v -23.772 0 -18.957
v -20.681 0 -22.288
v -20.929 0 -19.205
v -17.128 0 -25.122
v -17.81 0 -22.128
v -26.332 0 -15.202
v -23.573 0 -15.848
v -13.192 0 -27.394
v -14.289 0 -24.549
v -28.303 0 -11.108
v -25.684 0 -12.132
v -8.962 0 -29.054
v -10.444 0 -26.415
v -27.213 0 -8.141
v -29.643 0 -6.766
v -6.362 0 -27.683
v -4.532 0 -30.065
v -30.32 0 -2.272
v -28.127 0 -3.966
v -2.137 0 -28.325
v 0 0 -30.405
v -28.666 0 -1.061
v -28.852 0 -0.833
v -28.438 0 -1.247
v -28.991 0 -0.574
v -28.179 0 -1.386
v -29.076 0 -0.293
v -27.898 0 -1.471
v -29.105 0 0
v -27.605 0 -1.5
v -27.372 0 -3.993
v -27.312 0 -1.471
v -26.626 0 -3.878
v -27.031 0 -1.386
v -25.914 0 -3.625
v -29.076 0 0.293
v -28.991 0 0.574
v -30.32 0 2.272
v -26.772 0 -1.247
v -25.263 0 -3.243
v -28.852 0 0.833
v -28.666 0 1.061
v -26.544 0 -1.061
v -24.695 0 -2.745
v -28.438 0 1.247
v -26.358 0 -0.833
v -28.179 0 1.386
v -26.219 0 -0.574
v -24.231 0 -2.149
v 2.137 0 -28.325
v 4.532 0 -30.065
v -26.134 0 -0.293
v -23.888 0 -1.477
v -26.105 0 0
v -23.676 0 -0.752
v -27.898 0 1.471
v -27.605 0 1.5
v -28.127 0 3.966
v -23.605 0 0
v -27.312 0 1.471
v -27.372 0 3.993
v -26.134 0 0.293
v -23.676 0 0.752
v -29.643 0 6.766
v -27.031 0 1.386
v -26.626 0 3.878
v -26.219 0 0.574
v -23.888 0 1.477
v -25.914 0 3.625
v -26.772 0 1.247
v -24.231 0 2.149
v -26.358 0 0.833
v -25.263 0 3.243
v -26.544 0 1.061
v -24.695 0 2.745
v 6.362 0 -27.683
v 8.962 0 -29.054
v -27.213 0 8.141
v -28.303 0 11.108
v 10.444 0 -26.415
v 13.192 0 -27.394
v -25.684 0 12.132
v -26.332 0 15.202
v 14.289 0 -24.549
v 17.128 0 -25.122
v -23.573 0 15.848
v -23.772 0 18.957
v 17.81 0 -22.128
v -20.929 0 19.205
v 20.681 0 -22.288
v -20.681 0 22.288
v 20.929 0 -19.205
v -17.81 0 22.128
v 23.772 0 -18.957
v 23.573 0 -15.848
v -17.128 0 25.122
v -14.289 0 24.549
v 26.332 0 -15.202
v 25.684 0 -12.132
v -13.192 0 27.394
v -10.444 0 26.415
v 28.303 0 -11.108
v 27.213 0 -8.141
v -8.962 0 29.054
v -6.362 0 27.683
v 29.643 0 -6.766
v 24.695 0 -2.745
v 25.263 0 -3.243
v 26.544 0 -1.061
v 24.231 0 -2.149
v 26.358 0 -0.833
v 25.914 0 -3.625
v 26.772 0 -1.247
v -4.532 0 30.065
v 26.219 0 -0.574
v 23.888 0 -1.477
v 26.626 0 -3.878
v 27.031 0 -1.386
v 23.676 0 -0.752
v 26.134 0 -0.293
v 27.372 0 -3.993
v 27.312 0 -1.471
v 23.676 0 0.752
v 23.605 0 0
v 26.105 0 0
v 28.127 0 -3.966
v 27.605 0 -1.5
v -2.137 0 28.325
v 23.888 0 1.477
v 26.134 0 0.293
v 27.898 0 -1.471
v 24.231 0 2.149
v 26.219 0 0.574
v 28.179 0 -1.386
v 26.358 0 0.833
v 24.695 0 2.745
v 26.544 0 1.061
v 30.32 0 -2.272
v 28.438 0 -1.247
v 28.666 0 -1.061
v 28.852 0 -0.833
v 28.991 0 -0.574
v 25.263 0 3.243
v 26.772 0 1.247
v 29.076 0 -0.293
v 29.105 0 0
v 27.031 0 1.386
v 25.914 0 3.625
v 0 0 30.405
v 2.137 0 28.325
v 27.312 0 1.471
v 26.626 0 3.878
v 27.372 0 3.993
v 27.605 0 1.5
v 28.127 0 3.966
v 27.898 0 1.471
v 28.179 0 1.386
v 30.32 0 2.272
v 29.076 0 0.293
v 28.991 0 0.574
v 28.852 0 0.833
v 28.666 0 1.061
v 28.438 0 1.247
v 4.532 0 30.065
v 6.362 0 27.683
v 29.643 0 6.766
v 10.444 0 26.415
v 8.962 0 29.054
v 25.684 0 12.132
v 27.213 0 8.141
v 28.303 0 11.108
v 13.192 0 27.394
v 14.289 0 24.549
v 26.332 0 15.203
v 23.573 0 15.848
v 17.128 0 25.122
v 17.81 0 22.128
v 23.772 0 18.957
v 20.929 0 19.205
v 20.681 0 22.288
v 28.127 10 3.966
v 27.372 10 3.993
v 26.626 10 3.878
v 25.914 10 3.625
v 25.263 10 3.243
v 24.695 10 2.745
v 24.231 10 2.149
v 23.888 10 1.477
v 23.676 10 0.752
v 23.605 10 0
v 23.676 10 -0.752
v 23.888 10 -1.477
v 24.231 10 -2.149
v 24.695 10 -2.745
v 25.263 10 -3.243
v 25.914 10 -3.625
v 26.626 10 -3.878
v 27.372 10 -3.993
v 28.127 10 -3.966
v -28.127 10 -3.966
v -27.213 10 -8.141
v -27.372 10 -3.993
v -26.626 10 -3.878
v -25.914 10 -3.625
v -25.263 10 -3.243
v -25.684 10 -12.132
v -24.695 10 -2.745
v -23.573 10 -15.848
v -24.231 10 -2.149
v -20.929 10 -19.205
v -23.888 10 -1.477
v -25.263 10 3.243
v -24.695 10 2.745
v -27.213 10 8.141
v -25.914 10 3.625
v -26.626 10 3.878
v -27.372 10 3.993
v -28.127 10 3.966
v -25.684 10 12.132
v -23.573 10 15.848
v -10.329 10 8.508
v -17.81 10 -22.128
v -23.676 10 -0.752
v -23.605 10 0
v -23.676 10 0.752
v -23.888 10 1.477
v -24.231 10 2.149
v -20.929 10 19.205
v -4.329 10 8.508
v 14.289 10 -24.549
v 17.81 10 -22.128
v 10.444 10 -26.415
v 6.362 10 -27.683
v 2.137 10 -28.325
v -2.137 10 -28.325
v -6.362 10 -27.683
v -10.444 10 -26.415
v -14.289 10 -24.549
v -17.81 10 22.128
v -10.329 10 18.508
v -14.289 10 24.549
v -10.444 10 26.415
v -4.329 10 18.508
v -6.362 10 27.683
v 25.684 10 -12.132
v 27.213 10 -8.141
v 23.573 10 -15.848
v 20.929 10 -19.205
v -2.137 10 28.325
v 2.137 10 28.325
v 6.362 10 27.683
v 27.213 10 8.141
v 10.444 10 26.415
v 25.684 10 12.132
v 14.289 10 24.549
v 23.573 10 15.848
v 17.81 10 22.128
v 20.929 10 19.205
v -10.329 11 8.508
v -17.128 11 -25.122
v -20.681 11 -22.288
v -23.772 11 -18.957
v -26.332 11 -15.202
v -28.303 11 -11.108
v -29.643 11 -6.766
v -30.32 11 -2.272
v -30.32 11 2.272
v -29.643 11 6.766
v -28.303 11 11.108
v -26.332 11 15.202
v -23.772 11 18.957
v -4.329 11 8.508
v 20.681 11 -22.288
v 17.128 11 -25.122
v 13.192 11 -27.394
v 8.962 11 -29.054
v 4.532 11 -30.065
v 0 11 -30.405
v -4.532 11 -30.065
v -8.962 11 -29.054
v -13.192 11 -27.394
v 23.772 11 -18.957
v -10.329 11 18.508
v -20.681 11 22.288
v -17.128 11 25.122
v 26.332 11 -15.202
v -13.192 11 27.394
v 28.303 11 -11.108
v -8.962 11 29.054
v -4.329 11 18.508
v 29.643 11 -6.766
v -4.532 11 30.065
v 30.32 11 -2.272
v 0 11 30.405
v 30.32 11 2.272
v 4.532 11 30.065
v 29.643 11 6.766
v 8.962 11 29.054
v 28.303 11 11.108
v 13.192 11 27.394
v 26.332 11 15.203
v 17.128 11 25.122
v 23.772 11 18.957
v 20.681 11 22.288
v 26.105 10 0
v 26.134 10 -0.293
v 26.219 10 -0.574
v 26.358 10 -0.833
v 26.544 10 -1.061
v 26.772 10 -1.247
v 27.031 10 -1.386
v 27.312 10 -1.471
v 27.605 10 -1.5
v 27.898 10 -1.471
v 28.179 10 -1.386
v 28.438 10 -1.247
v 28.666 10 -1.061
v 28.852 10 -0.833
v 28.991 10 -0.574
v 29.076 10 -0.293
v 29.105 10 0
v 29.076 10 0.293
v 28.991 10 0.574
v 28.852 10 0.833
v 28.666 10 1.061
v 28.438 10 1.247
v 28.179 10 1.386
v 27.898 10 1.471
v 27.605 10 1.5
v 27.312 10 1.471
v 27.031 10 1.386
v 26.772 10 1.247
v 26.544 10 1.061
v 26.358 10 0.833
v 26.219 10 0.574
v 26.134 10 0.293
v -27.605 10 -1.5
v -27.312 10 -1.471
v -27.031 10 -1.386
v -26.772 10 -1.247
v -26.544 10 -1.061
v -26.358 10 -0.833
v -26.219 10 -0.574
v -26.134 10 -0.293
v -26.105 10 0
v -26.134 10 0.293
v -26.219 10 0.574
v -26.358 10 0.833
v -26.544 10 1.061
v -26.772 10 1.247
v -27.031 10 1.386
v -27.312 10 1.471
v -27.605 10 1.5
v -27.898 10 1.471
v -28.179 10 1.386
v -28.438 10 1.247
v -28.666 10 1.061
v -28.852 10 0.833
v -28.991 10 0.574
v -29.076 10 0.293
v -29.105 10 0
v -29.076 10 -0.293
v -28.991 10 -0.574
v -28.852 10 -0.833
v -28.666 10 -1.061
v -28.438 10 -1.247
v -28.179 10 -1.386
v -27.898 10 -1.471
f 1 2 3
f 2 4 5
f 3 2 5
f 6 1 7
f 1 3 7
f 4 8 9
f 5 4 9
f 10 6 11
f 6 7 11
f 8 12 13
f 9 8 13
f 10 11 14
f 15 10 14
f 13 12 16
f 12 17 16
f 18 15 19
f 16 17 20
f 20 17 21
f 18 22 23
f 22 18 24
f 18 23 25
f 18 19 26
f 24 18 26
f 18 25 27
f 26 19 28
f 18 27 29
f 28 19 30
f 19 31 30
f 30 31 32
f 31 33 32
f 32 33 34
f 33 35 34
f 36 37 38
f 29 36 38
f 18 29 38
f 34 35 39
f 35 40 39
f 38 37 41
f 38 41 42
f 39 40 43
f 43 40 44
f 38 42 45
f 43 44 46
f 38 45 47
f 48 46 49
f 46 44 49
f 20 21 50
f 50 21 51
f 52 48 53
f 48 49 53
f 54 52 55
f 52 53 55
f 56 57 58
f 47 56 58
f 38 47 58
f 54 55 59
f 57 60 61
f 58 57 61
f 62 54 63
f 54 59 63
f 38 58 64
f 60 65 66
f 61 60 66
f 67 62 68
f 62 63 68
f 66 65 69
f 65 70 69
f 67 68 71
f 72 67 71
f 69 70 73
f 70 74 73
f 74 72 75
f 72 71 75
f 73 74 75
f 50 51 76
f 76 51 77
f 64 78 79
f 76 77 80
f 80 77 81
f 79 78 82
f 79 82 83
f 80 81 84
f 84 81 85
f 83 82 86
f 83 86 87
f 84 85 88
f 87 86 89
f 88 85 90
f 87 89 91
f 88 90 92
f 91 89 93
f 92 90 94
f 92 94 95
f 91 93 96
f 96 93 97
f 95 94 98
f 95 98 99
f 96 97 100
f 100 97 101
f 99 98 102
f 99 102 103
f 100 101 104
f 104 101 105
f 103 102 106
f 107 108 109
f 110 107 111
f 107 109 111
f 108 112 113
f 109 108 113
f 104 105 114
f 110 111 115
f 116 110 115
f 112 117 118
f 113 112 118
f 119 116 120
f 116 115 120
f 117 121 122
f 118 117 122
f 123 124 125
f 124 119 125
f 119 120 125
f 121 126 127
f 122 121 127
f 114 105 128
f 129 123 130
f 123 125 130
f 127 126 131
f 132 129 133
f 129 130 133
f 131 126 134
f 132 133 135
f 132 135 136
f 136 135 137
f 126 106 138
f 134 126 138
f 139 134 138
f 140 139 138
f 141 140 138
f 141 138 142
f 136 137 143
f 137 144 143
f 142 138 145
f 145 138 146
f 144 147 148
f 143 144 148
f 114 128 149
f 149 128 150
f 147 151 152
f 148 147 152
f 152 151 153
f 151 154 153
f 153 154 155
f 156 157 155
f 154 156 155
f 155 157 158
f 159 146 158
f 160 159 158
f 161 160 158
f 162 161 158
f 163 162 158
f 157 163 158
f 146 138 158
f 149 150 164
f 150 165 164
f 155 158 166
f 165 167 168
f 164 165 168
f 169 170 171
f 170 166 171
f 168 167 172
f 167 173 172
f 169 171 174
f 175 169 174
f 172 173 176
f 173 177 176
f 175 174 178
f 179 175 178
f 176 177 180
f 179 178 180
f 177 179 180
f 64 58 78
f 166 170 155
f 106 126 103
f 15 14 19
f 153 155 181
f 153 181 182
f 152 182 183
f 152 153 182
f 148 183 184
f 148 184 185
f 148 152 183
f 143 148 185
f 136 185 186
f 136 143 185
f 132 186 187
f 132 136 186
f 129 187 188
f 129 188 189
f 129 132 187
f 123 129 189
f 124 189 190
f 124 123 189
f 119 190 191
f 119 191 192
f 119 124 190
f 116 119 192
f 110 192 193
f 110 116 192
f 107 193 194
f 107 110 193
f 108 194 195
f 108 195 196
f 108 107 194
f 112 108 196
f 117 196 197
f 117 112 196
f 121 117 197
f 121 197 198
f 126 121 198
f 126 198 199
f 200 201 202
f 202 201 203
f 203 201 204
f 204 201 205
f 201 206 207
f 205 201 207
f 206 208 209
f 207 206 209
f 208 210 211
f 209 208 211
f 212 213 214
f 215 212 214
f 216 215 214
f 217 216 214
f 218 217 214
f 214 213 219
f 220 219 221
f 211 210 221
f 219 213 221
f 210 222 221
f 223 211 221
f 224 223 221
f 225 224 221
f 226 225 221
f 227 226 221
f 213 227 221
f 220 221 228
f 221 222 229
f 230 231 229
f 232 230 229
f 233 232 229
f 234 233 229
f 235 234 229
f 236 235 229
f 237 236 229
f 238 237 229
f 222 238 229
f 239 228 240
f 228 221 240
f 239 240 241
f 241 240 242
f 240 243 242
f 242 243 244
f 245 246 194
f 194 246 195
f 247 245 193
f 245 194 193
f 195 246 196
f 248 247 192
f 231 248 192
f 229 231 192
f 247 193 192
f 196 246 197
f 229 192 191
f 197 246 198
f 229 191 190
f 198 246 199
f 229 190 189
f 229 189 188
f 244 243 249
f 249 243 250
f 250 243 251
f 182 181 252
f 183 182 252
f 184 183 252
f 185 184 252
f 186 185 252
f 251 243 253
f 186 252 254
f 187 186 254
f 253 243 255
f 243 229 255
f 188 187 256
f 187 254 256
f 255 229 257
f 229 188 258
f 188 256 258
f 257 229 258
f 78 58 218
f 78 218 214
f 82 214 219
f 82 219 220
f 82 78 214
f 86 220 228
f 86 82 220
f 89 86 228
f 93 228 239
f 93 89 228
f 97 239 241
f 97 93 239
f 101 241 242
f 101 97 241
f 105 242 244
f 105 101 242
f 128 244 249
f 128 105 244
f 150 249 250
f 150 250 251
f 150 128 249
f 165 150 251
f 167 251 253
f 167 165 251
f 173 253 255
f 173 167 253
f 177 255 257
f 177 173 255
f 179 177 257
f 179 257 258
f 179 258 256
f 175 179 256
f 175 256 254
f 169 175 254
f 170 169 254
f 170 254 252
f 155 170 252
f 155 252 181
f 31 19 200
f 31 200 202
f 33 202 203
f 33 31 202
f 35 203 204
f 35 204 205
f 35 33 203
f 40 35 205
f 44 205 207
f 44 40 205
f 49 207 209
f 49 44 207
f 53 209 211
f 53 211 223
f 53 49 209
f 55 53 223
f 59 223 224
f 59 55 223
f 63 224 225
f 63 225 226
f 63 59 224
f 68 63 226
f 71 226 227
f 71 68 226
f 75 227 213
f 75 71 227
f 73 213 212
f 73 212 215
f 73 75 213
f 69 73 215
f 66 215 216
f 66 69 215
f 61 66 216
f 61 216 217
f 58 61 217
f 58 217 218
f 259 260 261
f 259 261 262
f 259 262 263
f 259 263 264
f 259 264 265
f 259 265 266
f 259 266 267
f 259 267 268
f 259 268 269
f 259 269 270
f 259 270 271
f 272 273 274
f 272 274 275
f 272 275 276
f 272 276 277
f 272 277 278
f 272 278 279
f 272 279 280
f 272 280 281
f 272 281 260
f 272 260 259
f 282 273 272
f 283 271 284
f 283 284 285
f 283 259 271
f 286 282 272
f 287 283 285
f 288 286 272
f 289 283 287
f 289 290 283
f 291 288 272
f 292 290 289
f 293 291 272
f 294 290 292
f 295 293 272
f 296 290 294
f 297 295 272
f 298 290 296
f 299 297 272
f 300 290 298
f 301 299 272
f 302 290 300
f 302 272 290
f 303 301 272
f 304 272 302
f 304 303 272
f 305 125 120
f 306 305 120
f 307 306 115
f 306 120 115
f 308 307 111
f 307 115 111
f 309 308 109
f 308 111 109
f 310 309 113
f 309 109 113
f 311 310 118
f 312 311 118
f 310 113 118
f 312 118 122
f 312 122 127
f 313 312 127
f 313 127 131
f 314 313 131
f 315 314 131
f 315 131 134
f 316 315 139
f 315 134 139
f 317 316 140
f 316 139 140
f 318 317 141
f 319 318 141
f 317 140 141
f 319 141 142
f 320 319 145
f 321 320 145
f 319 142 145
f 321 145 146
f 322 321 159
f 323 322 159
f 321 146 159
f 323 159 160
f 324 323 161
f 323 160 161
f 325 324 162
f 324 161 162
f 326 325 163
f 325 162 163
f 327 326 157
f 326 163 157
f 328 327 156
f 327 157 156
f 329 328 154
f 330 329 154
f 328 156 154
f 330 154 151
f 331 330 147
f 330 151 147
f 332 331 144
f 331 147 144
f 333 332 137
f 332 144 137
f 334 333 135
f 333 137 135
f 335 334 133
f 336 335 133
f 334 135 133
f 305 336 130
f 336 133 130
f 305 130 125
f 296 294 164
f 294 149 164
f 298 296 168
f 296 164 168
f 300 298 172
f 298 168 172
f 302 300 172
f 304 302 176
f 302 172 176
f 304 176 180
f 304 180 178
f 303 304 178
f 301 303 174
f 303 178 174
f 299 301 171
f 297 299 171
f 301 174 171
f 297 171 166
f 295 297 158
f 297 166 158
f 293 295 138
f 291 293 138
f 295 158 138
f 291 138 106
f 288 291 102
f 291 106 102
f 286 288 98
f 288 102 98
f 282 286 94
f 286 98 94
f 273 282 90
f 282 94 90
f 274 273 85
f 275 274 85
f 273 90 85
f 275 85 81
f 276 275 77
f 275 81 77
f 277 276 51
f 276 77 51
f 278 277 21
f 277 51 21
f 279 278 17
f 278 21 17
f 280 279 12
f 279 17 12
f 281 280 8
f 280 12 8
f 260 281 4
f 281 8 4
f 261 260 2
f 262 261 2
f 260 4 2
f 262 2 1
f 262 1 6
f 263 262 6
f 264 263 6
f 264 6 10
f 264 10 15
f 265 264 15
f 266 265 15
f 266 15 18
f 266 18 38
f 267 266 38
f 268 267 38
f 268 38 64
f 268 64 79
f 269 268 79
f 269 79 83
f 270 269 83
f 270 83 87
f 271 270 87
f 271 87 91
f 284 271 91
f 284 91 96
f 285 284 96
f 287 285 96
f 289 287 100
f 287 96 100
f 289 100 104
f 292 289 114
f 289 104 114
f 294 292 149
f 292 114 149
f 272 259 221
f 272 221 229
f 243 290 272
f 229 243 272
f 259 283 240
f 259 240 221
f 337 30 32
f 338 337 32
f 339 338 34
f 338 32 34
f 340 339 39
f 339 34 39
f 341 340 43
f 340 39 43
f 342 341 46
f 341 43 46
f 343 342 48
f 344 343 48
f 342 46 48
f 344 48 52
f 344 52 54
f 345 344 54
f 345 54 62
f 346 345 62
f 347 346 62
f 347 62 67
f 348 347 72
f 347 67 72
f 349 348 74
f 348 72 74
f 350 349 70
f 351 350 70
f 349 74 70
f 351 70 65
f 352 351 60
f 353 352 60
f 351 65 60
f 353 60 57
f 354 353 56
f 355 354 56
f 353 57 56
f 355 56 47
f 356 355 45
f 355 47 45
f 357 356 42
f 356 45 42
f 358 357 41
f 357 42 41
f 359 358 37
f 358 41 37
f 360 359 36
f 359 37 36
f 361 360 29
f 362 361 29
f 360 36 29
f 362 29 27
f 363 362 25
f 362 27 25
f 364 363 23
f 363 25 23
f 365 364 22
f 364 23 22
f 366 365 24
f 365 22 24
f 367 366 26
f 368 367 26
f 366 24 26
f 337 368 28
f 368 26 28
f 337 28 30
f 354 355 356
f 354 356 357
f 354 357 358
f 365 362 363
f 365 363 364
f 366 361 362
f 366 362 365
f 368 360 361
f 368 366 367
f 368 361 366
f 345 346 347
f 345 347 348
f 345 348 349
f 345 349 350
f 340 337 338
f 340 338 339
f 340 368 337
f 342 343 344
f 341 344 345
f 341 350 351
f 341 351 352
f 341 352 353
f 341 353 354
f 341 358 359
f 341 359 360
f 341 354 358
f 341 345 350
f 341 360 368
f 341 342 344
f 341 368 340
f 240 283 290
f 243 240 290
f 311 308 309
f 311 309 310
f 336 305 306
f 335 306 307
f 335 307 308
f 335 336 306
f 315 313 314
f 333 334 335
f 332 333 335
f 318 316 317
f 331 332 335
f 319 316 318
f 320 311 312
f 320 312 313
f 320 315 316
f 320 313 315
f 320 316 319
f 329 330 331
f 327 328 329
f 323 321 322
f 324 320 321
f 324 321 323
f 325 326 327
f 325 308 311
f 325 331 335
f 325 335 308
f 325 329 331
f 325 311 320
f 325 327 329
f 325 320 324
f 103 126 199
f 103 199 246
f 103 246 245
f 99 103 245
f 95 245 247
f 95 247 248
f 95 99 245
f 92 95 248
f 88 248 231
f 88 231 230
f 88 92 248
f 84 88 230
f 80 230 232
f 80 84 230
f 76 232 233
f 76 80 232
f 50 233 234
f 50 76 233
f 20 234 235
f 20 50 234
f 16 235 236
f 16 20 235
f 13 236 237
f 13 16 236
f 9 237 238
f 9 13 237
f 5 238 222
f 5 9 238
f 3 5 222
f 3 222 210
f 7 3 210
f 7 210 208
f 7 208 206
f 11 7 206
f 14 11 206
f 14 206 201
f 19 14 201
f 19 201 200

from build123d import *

# Parameters (mm, degrees)
SKIZZE1_R                       = 30.405
SKIZZE1_R_2                     = 28.405
AUFSATZ_LINEAR_AUSTRAGEN1_DEPTH = 10
SKIZZE2_R                       = 30.405
AUFSATZ_LINEAR_AUSTRAGEN2_DEPTH = 1
AUFSATZ_LINEAR_START            = 10
AUFSATZ_LINEAR_AUSTRAGEN3_DEPTH = 10
SKIZZE5_R                       = 1.5
SCHNITT_LINEAR_AUSTRAGEN2_DEPTH = 10
SKIZZE6_W                       = 6
SKIZZE6_H                       = 10
SCHNITT_LINEAR_AUSTRAGEN3_DEPTH = 10


with BuildPart() as part:
    # Skizze1 → Aufsatz-Linear austragen1 (new body)
    with BuildSketch(Plane(origin=(0, 0, 0), x_dir=(1, 0, 0), z_dir=(0, 1, 0))):
        with Locations(Location((0, 0, 0), (0, 0, 270))):
            Circle(SKIZZE1_R)
        with Locations(Location((0, 0, 0), (0, 0, 270))):
            Circle(SKIZZE1_R_2, mode=Mode.SUBTRACT)
    extrude(amount=AUFSATZ_LINEAR_AUSTRAGEN1_DEPTH)

    # Skizze2 → Aufsatz-Linear austragen2 (add)
    with BuildSketch(Plane(origin=(0, 10, 0), x_dir=(1, 0, 0), z_dir=(0, 1, 0))):
        with Locations(Location((0, 0, 0), (0, 0, 270))):
            Circle(SKIZZE2_R)
    extrude(amount=AUFSATZ_LINEAR_AUSTRAGEN2_DEPTH)

    # Skizze4 → Aufsatz-Linear austragen3 (add)
    with BuildSketch(Plane.XZ.offset(-10).offset(AUFSATZ_LINEAR_START)):
        with BuildLine():
            ThreePointArc((-28.126789531, -3.965820935), (-23.605, 0), (-28.126789531, 3.965820935))
            ThreePointArc((-28.126789531, 3.965820935), (-28.405, 0), (-28.126789531, -3.965820935))
        make_face()
        with BuildLine():
            ThreePointArc((28.405, 0), (28.33536202, 1.987783738), (28.126789531, 3.965820935))
            ThreePointArc((28.126789531, 3.965820935), (23.605, 0), (28.126789531, -3.965820935))
            ThreePointArc((28.126789531, -3.965820935), (28.33536202, -1.987783738), (28.405, 0))
        make_face()
    extrude(amount=-AUFSATZ_LINEAR_AUSTRAGEN3_DEPTH)

    # Skizze5 → Schnitt-Linear austragen2 (cut)
    with BuildSketch(Plane.XZ):
        with Locations(Location((-27.605, 0, 0), (0, 0, 270))):
            Circle(SKIZZE5_R)
        with BuildLine():
            ThreePointArc((29.105, 0), (27.605, 1.5), (26.105, 0))
            Line((26.105, 0), (29.105, 0))
        make_face()
        with BuildLine():
            Line((29.105, 0), (26.105, 0))
            ThreePointArc((26.105, 0), (27.605, -1.5), (29.105, 0))
        make_face()
    extrude(amount=-SCHNITT_LINEAR_AUSTRAGEN2_DEPTH, mode=Mode.SUBTRACT)

    # Skizze6 → Schnitt-Linear austragen3 (cut)
    with BuildSketch(Plane(origin=(0, 11, 0), x_dir=(1, 0, 0), z_dir=(0, 1, 0))):
        with Locations((-7.328778972, -13.508309901)):
            Rectangle(SKIZZE6_W, SKIZZE6_H)
    extrude(amount=-SCHNITT_LINEAR_AUSTRAGEN3_DEPTH, mode=Mode.SUBTRACT)


solid = part.part
